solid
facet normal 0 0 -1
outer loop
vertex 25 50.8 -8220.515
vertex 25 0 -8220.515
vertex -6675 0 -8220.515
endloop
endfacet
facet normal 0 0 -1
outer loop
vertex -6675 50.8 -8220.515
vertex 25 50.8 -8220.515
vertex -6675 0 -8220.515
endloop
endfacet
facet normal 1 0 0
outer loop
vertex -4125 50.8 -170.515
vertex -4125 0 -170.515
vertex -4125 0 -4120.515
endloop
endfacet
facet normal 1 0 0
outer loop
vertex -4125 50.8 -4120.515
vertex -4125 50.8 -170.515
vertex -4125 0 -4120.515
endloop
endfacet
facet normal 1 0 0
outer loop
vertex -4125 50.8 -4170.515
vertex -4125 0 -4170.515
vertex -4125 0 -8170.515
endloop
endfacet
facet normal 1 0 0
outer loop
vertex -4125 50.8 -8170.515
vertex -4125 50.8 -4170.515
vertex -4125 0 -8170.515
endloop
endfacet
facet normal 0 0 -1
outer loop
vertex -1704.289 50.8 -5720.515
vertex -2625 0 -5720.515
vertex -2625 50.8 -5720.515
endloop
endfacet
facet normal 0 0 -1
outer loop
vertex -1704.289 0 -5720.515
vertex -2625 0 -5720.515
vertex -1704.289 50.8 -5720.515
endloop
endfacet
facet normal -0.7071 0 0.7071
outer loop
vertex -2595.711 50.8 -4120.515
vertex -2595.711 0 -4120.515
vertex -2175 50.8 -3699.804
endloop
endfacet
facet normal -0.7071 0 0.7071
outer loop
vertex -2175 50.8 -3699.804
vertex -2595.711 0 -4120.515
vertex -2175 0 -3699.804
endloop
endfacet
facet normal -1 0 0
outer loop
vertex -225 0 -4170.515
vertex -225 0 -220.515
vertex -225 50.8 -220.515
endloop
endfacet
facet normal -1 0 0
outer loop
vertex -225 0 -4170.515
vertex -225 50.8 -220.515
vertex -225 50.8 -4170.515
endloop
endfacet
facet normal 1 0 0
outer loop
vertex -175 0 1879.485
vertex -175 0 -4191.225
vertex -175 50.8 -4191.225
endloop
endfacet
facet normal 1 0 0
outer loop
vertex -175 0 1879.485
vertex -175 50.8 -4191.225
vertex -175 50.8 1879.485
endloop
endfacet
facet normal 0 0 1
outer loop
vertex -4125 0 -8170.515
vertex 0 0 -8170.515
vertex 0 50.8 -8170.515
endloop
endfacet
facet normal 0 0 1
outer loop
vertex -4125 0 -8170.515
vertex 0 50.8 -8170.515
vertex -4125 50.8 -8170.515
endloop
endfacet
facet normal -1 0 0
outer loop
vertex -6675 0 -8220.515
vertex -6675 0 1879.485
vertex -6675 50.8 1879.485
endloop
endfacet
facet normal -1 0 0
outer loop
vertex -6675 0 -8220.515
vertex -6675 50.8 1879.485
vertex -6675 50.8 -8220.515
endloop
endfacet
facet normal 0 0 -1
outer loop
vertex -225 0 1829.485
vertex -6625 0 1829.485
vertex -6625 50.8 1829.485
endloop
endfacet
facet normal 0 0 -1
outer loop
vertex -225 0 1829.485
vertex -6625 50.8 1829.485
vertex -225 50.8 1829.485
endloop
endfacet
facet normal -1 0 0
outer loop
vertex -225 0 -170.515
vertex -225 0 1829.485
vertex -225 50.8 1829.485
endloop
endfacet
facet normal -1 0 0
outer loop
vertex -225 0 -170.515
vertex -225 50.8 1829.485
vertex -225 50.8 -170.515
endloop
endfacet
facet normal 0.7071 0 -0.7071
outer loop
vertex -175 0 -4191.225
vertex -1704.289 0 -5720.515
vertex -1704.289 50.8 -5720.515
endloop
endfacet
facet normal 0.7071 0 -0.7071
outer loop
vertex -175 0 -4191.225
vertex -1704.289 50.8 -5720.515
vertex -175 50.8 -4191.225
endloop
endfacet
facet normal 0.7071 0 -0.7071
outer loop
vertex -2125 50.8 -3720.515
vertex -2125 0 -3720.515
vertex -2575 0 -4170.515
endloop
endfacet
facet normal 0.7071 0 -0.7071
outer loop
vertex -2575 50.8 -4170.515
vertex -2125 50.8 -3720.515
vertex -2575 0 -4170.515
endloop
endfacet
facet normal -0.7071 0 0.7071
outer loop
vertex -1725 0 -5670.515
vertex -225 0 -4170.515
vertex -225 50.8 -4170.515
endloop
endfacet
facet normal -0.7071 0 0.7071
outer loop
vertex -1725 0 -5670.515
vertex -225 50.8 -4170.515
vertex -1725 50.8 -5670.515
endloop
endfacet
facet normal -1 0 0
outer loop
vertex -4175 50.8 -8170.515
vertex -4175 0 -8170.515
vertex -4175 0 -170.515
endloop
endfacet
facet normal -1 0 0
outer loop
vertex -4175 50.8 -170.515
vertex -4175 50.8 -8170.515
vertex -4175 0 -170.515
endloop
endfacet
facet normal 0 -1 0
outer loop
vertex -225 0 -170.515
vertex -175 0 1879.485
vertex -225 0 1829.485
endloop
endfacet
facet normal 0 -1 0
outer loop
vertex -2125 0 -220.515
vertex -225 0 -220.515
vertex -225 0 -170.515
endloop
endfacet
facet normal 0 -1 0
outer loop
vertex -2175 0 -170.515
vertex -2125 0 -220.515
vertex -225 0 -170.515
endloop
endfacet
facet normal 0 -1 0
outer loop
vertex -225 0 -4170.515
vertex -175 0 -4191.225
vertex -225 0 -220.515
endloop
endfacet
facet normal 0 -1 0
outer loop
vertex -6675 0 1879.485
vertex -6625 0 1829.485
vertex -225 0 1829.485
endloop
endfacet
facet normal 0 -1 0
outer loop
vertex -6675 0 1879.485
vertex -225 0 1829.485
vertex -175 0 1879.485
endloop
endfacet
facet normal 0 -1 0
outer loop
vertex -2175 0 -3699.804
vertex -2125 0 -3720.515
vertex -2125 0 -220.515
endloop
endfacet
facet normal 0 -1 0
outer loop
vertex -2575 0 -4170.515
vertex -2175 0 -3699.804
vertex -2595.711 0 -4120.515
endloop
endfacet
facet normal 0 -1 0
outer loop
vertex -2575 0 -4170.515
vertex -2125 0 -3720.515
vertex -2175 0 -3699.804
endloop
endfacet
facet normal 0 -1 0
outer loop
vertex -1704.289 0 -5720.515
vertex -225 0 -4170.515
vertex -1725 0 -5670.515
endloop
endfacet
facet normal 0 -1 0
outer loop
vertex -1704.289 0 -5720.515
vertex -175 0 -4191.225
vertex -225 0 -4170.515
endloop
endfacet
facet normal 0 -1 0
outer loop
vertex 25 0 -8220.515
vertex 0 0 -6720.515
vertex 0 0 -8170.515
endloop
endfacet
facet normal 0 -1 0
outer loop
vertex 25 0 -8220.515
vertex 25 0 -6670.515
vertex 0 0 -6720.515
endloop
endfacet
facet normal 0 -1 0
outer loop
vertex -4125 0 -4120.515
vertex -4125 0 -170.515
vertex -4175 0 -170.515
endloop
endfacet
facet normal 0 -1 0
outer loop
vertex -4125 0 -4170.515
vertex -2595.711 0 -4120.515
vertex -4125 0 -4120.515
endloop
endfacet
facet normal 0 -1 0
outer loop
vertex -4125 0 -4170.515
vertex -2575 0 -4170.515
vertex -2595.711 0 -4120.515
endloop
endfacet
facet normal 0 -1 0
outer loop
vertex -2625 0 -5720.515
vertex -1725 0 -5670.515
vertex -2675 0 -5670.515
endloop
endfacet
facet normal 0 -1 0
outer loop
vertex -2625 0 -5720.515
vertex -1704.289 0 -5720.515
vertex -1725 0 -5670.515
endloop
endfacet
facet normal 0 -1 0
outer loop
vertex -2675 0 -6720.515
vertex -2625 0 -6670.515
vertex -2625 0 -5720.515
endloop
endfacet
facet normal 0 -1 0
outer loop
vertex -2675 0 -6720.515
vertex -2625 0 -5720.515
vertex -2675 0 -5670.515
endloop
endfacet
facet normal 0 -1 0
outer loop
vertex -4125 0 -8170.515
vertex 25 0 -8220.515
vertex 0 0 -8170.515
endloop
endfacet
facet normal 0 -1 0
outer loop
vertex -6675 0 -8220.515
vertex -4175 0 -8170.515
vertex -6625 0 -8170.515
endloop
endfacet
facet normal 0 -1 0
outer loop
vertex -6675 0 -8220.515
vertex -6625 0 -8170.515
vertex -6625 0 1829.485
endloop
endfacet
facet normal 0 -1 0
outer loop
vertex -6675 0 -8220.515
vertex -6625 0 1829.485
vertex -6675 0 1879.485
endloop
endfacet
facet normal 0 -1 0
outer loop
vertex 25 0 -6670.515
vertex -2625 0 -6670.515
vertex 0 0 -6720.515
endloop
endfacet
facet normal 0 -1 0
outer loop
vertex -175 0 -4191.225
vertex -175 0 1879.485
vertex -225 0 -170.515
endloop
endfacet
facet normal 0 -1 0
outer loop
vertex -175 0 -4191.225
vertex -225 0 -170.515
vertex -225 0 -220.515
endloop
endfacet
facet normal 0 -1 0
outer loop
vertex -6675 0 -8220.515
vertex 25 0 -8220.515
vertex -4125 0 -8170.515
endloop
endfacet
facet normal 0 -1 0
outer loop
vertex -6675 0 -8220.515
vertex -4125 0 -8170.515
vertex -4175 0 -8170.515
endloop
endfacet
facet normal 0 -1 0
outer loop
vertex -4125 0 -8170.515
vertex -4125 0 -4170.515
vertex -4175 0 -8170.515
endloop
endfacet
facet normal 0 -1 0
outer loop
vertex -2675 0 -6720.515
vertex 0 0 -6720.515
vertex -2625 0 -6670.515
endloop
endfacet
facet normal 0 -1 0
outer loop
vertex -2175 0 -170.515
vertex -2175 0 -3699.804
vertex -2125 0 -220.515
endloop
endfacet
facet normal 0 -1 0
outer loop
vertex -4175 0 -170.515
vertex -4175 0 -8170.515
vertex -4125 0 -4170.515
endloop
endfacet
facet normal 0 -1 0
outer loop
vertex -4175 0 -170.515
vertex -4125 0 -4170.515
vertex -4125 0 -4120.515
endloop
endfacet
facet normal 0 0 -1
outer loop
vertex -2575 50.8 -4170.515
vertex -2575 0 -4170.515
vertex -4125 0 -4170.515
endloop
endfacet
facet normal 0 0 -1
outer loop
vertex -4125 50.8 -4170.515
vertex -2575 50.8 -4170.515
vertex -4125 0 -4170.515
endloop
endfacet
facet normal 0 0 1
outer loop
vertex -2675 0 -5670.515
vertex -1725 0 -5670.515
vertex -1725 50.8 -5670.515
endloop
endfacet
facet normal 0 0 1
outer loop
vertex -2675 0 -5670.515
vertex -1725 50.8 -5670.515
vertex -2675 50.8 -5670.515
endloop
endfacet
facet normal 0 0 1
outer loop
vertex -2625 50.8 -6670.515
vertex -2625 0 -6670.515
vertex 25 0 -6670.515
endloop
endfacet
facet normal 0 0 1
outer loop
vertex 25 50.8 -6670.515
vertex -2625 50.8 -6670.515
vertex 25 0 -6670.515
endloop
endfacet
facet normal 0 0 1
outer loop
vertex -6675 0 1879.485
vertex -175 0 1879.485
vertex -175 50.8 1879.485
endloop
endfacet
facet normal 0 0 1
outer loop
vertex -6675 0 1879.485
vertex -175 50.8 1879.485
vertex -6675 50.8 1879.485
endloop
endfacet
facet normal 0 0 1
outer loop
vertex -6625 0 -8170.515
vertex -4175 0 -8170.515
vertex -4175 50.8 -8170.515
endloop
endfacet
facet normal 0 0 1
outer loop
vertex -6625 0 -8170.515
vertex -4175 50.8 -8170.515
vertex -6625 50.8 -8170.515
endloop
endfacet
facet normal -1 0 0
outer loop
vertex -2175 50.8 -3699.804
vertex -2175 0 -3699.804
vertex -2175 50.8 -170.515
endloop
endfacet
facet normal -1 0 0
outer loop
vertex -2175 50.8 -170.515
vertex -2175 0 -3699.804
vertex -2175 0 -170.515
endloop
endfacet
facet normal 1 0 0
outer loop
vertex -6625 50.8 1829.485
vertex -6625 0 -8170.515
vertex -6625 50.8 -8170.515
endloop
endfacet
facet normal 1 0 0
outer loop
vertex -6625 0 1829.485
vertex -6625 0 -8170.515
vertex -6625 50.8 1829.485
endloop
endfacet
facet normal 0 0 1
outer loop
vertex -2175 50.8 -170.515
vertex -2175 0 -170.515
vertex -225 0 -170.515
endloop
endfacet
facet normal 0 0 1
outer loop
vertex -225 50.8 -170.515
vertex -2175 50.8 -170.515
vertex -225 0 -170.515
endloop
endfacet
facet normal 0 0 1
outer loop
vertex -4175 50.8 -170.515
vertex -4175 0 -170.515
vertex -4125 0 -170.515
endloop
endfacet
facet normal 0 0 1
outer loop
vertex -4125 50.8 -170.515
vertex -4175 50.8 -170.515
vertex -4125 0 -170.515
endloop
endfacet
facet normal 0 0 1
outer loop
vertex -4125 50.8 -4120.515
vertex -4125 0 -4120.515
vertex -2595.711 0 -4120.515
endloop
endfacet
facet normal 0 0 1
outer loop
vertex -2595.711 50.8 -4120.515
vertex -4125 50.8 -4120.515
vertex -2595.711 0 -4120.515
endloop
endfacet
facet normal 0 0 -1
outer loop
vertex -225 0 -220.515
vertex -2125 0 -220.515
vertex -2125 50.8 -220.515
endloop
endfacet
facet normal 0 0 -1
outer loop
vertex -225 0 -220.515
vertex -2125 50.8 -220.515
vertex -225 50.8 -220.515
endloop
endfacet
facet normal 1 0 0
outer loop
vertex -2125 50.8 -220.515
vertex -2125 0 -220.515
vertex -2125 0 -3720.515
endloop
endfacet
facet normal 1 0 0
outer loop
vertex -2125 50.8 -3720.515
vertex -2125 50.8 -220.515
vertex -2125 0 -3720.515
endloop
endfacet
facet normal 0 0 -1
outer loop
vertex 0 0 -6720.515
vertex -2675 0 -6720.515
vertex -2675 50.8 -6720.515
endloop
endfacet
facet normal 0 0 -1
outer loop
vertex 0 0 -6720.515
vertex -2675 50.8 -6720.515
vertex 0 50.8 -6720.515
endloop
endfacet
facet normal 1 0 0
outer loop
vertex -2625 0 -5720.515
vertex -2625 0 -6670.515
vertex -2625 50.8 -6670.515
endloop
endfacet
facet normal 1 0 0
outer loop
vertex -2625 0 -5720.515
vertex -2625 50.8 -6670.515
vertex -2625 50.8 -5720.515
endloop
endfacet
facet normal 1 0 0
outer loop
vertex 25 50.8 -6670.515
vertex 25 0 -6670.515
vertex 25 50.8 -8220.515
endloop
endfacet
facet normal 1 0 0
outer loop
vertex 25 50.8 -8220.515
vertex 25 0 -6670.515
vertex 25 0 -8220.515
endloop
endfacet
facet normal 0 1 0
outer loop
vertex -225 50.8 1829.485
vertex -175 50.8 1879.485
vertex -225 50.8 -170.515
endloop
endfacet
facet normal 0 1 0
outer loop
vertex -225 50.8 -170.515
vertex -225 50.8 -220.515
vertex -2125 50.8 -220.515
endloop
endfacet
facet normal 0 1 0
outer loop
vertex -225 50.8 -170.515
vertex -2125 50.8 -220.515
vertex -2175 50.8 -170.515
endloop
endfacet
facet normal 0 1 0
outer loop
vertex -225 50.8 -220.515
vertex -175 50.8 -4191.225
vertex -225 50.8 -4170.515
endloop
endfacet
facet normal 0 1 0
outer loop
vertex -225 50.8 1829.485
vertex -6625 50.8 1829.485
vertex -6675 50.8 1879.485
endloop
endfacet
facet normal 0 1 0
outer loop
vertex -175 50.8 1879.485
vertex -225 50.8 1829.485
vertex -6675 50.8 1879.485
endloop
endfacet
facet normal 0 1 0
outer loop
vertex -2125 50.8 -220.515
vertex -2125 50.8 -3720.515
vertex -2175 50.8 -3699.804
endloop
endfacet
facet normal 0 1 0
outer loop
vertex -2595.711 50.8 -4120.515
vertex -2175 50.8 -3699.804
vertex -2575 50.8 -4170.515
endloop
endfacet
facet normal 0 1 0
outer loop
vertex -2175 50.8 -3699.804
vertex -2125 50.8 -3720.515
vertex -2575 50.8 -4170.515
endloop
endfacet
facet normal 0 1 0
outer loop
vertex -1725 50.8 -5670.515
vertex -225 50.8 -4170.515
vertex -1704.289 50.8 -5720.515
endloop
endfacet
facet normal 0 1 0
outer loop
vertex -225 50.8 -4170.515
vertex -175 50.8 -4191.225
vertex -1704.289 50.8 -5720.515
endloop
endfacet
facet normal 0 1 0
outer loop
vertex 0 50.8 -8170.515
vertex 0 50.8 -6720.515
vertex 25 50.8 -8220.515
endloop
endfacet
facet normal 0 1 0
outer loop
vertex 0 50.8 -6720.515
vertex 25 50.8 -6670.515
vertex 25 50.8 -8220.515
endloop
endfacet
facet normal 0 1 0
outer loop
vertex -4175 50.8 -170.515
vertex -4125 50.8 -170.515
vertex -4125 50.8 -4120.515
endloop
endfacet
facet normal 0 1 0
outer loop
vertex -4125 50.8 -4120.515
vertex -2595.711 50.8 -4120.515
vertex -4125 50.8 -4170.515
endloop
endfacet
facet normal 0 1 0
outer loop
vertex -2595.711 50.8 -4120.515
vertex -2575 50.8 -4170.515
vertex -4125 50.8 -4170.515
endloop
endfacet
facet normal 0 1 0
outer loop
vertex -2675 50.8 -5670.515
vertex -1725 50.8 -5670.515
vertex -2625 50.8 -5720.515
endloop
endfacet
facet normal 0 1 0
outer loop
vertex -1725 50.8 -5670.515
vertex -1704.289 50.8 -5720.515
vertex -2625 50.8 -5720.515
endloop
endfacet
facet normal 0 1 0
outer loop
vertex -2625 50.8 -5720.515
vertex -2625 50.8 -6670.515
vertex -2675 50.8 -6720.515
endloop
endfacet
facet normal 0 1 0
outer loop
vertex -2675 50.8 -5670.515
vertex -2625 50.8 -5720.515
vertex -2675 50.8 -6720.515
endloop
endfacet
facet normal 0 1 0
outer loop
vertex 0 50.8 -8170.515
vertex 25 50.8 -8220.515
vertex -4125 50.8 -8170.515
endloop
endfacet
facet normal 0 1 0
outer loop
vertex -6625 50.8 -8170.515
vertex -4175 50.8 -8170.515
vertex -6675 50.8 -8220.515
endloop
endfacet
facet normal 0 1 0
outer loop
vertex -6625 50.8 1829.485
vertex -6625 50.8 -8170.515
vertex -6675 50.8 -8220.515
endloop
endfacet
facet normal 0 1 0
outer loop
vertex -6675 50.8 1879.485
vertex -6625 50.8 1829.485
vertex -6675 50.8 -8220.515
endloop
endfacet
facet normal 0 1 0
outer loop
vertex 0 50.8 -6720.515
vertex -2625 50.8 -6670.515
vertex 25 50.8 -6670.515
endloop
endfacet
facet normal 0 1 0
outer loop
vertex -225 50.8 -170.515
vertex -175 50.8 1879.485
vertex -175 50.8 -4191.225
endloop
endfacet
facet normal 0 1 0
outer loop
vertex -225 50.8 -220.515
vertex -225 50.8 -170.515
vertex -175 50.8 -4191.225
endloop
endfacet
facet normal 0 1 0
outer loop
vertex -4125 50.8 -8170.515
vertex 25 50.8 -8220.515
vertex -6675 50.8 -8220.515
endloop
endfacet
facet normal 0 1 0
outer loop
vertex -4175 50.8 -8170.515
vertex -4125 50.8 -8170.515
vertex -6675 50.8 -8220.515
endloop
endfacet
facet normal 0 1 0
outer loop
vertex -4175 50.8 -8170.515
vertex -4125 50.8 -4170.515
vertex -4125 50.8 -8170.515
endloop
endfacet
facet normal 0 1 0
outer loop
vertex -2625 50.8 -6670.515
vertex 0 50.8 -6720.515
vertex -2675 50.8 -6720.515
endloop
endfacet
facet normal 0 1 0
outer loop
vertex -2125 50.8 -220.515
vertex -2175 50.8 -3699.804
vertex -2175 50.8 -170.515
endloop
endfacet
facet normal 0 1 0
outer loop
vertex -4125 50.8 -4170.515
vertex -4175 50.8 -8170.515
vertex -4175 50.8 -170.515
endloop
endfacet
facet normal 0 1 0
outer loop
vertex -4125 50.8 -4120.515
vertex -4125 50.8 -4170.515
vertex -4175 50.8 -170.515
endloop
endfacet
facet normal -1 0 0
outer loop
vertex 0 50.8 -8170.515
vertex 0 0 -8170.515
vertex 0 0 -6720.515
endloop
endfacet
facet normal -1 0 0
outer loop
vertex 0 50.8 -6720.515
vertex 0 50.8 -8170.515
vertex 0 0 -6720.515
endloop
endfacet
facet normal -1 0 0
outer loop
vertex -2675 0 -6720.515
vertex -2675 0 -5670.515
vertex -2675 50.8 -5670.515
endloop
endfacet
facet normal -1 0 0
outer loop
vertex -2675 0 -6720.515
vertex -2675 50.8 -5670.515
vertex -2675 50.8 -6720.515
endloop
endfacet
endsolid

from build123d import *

# Parameters (mm, degrees)
SKETCH1_W           = 1900
SKETCH1_H           = 50
BOSS_EXTRUDE1_DEPTH = 50.8


with BuildPart() as part:
    # Sketch1 → Boss-Extrude1 (new body)
    with BuildSketch(Plane(origin=(0, 0, 0), x_dir=(1, 0, 0), z_dir=(0, 1, 0))):
        Polygon((0, 6720.514582342), (0, 6670.514582342), (-2625, 6670.514582342), (-2625, 5720.514582342), (-1704.289321881, 5720.514582342), (-175, 4191.225260461), (-175, -1879.485417658), (-6675, -1879.485417658), (-6675, 8220.514582342), (0, 8220.514582342), (0, 8170.514582342), (-6625, 8170.514582342), (-6625, -1829.485417658), (-225, -1829.485417658), (-225, 4170.514582342), (-1725, 5670.514582342), (-2675, 5670.514582342), (-2675, 6720.514582342), align=None)
        Polygon((0, 8170.514582342), (0, 6720.514582342), (0, 6670.514582342), (25, 6670.514582342), (25, 8220.514582342), (0, 8220.514582342), align=None)
        Polygon((-4125, 4120.514582342), (-4125, 4170.514582342), (-4125, 8170.514582342), (-4175, 8170.514582342), (-4175, 170.514582342), (-4125, 170.514582342), align=None)
        Polygon((-2125, 170.514582342), (-2125, 220.514582342), (-2125, 3720.514582342), (-2575, 4170.514582342), (-4125, 4170.514582342), (-4125, 4120.514582342), (-2595.710678119, 4120.514582342), (-2175, 3699.803904224), (-2175, 170.514582342), align=None)
        with Locations((-1175, 195.514582342)):
            Rectangle(SKETCH1_W, SKETCH1_H)
    extrude(amount=BOSS_EXTRUDE1_DEPTH)


solid = part.part
